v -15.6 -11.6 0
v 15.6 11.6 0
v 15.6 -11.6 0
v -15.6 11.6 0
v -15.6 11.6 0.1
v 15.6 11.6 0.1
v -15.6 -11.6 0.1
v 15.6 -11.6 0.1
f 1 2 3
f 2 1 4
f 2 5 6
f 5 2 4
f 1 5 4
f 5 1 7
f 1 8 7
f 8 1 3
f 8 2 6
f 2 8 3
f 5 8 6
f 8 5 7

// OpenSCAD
// file: ../p/box5-12.scad
use <../lib.scad>
function ldraw_lib__box5_12() = [
// 0 Box with 5 Faces without Any Edges
// 0 Name: box5-12.dat
// 0 Author: Chris Dee [cwdee]
// 0 !LDRAW_ORG Primitive UPDATE 2009-02
// 0 !LICENSE Licensed under CC BY 4.0 : see CAreadme.txt
// 
// 0 BFC CERTIFY CCW
  [0,"BFC","CERTIFY"],
  [0,"BFC","CCW"],
// 
// 0 !HISTORY 2009-09-03 [PTadmin] Official Update 2009-02
// 
// 
// 4 16 1 1 1 1 1 -1 -1 1 -1 -1 1 1
  [4,16,1,1,1,1,1,-1,-1,1,-1,-1,1,1],
// 4 16 -1 0 1 1 0 1 1 1 1 -1 1 1
  [4,16,-1,0,1,1,0,1,1,1,1,-1,1,1],
// 4 16 -1 0 -1 -1 0 1 -1 1 1 -1 1 -1
  [4,16,-1,0,-1,-1,0,1,-1,1,1,-1,1,-1],
// 4 16 1 0 -1 -1 0 -1 -1 1 -1 1 1 -1
  [4,16,1,0,-1,-1,0,-1,-1,1,-1,1,1,-1],
// 4 16 1 0 1 1 0 -1 1 1 -1 1 1 1
  [4,16,1,0,1,1,0,-1,1,1,-1,1,1,1],
// 0
];
module ldraw_lib__box5_12(step=0, col=false, unit=2/5, alt=false, line=0.2, solid=!$preview)
    makepoly(ldraw_lib__box5_12(), step=step, col=col, unit=unit, alt=alt, line=line, solid=solid);
ldraw_lib__box5_12(line=0.2);
// file: 4620858f.scad
use <../lib.scad>
use <../p/box5-12.scad>
function ldraw_lib__4620858f() = [
// 0 Sticker  2.9 x  3.9 with Chrome Silver Mirror
// 0 Name: 4620858f.dat
// 0 Author: Takeshi Takahashi [RainbowDolphin]
// 0 !LDRAW_ORG Part UPDATE 2024-05
// 0 !LICENSE Licensed under CC BY 4.0 : see CAreadme.txt
// 
// 0 BFC CERTIFY CCW
  [0,"BFC","CERTIFY"],
  [0,"BFC","CCW"],
// 
// 0 !KEYWORDS Beauty Shop, Cosmetics, set 3187
// 
// 0 !HISTORY 2024-06-30 [OrionP] Official Update 2024-05
// 
// 
// 1 16 0 -0.25 0 39 0 0 0 0.25 0 0 0 29 box5-12.dat
  [1,16,0,-0.25,0,39,0,0,0,0.25,0,0,0,29, ldraw_lib__box5_12()],
// 
// 4 383 39 -0.25 29 -39 -0.25 29 -39 -0.25 -29 39 -0.25 -29
  [4,383,39,-0.25,29,-39,-0.25,29,-39,-0.25,-29,39,-0.25,-29],
];
module ldraw_lib__4620858f(step=0, col=false, unit=2/5, alt=false, line=0.2, solid=!$preview)
    makepoly(ldraw_lib__4620858f(), step=step, col=col, unit=unit, alt=alt, line=line, solid=solid);
ldraw_lib__4620858f(line=0.2);
// main file
use <../lib.scad>
use <4620858f.scad>
function ldraw_lib__6018358b() = [
// 0 =Sticker  2.9 x  3.9 with Chrome Silver Mirror
// 0 Name: 6018358b.dat
// 0 Author: Takeshi Takahashi [RainbowDolphin]
// 0 !LDRAW_ORG Part Alias UPDATE 2024-05
// 0 !LICENSE Licensed under CC BY 4.0 : see CAreadme.txt
// 
// 0 BFC CERTIFY CCW
  [0,"BFC","CERTIFY"],
  [0,"BFC","CCW"],
// 
// 0 !KEYWORDS Dressing table, Set 41004
// 
// 0 !HISTORY 2024-06-30 [OrionP] Official Update 2024-05
// 
// 
// 0 // Alias of 4620858f
// 1 16 0 0 0 1 0 0 0 1 0 0 0 1 4620858f.dat
  [1,16,0,0,0,1,0,0,0,1,0,0,0,1, ldraw_lib__4620858f()],
];
module ldraw_lib__6018358b(step=0, col=false, unit=2/5, alt=false, line=0.2, solid=!$preview)
    makepoly(ldraw_lib__6018358b(), step=step, col=col, unit=unit, alt=alt, line=line, solid=solid);
ldraw_lib__6018358b(line=0.2);
